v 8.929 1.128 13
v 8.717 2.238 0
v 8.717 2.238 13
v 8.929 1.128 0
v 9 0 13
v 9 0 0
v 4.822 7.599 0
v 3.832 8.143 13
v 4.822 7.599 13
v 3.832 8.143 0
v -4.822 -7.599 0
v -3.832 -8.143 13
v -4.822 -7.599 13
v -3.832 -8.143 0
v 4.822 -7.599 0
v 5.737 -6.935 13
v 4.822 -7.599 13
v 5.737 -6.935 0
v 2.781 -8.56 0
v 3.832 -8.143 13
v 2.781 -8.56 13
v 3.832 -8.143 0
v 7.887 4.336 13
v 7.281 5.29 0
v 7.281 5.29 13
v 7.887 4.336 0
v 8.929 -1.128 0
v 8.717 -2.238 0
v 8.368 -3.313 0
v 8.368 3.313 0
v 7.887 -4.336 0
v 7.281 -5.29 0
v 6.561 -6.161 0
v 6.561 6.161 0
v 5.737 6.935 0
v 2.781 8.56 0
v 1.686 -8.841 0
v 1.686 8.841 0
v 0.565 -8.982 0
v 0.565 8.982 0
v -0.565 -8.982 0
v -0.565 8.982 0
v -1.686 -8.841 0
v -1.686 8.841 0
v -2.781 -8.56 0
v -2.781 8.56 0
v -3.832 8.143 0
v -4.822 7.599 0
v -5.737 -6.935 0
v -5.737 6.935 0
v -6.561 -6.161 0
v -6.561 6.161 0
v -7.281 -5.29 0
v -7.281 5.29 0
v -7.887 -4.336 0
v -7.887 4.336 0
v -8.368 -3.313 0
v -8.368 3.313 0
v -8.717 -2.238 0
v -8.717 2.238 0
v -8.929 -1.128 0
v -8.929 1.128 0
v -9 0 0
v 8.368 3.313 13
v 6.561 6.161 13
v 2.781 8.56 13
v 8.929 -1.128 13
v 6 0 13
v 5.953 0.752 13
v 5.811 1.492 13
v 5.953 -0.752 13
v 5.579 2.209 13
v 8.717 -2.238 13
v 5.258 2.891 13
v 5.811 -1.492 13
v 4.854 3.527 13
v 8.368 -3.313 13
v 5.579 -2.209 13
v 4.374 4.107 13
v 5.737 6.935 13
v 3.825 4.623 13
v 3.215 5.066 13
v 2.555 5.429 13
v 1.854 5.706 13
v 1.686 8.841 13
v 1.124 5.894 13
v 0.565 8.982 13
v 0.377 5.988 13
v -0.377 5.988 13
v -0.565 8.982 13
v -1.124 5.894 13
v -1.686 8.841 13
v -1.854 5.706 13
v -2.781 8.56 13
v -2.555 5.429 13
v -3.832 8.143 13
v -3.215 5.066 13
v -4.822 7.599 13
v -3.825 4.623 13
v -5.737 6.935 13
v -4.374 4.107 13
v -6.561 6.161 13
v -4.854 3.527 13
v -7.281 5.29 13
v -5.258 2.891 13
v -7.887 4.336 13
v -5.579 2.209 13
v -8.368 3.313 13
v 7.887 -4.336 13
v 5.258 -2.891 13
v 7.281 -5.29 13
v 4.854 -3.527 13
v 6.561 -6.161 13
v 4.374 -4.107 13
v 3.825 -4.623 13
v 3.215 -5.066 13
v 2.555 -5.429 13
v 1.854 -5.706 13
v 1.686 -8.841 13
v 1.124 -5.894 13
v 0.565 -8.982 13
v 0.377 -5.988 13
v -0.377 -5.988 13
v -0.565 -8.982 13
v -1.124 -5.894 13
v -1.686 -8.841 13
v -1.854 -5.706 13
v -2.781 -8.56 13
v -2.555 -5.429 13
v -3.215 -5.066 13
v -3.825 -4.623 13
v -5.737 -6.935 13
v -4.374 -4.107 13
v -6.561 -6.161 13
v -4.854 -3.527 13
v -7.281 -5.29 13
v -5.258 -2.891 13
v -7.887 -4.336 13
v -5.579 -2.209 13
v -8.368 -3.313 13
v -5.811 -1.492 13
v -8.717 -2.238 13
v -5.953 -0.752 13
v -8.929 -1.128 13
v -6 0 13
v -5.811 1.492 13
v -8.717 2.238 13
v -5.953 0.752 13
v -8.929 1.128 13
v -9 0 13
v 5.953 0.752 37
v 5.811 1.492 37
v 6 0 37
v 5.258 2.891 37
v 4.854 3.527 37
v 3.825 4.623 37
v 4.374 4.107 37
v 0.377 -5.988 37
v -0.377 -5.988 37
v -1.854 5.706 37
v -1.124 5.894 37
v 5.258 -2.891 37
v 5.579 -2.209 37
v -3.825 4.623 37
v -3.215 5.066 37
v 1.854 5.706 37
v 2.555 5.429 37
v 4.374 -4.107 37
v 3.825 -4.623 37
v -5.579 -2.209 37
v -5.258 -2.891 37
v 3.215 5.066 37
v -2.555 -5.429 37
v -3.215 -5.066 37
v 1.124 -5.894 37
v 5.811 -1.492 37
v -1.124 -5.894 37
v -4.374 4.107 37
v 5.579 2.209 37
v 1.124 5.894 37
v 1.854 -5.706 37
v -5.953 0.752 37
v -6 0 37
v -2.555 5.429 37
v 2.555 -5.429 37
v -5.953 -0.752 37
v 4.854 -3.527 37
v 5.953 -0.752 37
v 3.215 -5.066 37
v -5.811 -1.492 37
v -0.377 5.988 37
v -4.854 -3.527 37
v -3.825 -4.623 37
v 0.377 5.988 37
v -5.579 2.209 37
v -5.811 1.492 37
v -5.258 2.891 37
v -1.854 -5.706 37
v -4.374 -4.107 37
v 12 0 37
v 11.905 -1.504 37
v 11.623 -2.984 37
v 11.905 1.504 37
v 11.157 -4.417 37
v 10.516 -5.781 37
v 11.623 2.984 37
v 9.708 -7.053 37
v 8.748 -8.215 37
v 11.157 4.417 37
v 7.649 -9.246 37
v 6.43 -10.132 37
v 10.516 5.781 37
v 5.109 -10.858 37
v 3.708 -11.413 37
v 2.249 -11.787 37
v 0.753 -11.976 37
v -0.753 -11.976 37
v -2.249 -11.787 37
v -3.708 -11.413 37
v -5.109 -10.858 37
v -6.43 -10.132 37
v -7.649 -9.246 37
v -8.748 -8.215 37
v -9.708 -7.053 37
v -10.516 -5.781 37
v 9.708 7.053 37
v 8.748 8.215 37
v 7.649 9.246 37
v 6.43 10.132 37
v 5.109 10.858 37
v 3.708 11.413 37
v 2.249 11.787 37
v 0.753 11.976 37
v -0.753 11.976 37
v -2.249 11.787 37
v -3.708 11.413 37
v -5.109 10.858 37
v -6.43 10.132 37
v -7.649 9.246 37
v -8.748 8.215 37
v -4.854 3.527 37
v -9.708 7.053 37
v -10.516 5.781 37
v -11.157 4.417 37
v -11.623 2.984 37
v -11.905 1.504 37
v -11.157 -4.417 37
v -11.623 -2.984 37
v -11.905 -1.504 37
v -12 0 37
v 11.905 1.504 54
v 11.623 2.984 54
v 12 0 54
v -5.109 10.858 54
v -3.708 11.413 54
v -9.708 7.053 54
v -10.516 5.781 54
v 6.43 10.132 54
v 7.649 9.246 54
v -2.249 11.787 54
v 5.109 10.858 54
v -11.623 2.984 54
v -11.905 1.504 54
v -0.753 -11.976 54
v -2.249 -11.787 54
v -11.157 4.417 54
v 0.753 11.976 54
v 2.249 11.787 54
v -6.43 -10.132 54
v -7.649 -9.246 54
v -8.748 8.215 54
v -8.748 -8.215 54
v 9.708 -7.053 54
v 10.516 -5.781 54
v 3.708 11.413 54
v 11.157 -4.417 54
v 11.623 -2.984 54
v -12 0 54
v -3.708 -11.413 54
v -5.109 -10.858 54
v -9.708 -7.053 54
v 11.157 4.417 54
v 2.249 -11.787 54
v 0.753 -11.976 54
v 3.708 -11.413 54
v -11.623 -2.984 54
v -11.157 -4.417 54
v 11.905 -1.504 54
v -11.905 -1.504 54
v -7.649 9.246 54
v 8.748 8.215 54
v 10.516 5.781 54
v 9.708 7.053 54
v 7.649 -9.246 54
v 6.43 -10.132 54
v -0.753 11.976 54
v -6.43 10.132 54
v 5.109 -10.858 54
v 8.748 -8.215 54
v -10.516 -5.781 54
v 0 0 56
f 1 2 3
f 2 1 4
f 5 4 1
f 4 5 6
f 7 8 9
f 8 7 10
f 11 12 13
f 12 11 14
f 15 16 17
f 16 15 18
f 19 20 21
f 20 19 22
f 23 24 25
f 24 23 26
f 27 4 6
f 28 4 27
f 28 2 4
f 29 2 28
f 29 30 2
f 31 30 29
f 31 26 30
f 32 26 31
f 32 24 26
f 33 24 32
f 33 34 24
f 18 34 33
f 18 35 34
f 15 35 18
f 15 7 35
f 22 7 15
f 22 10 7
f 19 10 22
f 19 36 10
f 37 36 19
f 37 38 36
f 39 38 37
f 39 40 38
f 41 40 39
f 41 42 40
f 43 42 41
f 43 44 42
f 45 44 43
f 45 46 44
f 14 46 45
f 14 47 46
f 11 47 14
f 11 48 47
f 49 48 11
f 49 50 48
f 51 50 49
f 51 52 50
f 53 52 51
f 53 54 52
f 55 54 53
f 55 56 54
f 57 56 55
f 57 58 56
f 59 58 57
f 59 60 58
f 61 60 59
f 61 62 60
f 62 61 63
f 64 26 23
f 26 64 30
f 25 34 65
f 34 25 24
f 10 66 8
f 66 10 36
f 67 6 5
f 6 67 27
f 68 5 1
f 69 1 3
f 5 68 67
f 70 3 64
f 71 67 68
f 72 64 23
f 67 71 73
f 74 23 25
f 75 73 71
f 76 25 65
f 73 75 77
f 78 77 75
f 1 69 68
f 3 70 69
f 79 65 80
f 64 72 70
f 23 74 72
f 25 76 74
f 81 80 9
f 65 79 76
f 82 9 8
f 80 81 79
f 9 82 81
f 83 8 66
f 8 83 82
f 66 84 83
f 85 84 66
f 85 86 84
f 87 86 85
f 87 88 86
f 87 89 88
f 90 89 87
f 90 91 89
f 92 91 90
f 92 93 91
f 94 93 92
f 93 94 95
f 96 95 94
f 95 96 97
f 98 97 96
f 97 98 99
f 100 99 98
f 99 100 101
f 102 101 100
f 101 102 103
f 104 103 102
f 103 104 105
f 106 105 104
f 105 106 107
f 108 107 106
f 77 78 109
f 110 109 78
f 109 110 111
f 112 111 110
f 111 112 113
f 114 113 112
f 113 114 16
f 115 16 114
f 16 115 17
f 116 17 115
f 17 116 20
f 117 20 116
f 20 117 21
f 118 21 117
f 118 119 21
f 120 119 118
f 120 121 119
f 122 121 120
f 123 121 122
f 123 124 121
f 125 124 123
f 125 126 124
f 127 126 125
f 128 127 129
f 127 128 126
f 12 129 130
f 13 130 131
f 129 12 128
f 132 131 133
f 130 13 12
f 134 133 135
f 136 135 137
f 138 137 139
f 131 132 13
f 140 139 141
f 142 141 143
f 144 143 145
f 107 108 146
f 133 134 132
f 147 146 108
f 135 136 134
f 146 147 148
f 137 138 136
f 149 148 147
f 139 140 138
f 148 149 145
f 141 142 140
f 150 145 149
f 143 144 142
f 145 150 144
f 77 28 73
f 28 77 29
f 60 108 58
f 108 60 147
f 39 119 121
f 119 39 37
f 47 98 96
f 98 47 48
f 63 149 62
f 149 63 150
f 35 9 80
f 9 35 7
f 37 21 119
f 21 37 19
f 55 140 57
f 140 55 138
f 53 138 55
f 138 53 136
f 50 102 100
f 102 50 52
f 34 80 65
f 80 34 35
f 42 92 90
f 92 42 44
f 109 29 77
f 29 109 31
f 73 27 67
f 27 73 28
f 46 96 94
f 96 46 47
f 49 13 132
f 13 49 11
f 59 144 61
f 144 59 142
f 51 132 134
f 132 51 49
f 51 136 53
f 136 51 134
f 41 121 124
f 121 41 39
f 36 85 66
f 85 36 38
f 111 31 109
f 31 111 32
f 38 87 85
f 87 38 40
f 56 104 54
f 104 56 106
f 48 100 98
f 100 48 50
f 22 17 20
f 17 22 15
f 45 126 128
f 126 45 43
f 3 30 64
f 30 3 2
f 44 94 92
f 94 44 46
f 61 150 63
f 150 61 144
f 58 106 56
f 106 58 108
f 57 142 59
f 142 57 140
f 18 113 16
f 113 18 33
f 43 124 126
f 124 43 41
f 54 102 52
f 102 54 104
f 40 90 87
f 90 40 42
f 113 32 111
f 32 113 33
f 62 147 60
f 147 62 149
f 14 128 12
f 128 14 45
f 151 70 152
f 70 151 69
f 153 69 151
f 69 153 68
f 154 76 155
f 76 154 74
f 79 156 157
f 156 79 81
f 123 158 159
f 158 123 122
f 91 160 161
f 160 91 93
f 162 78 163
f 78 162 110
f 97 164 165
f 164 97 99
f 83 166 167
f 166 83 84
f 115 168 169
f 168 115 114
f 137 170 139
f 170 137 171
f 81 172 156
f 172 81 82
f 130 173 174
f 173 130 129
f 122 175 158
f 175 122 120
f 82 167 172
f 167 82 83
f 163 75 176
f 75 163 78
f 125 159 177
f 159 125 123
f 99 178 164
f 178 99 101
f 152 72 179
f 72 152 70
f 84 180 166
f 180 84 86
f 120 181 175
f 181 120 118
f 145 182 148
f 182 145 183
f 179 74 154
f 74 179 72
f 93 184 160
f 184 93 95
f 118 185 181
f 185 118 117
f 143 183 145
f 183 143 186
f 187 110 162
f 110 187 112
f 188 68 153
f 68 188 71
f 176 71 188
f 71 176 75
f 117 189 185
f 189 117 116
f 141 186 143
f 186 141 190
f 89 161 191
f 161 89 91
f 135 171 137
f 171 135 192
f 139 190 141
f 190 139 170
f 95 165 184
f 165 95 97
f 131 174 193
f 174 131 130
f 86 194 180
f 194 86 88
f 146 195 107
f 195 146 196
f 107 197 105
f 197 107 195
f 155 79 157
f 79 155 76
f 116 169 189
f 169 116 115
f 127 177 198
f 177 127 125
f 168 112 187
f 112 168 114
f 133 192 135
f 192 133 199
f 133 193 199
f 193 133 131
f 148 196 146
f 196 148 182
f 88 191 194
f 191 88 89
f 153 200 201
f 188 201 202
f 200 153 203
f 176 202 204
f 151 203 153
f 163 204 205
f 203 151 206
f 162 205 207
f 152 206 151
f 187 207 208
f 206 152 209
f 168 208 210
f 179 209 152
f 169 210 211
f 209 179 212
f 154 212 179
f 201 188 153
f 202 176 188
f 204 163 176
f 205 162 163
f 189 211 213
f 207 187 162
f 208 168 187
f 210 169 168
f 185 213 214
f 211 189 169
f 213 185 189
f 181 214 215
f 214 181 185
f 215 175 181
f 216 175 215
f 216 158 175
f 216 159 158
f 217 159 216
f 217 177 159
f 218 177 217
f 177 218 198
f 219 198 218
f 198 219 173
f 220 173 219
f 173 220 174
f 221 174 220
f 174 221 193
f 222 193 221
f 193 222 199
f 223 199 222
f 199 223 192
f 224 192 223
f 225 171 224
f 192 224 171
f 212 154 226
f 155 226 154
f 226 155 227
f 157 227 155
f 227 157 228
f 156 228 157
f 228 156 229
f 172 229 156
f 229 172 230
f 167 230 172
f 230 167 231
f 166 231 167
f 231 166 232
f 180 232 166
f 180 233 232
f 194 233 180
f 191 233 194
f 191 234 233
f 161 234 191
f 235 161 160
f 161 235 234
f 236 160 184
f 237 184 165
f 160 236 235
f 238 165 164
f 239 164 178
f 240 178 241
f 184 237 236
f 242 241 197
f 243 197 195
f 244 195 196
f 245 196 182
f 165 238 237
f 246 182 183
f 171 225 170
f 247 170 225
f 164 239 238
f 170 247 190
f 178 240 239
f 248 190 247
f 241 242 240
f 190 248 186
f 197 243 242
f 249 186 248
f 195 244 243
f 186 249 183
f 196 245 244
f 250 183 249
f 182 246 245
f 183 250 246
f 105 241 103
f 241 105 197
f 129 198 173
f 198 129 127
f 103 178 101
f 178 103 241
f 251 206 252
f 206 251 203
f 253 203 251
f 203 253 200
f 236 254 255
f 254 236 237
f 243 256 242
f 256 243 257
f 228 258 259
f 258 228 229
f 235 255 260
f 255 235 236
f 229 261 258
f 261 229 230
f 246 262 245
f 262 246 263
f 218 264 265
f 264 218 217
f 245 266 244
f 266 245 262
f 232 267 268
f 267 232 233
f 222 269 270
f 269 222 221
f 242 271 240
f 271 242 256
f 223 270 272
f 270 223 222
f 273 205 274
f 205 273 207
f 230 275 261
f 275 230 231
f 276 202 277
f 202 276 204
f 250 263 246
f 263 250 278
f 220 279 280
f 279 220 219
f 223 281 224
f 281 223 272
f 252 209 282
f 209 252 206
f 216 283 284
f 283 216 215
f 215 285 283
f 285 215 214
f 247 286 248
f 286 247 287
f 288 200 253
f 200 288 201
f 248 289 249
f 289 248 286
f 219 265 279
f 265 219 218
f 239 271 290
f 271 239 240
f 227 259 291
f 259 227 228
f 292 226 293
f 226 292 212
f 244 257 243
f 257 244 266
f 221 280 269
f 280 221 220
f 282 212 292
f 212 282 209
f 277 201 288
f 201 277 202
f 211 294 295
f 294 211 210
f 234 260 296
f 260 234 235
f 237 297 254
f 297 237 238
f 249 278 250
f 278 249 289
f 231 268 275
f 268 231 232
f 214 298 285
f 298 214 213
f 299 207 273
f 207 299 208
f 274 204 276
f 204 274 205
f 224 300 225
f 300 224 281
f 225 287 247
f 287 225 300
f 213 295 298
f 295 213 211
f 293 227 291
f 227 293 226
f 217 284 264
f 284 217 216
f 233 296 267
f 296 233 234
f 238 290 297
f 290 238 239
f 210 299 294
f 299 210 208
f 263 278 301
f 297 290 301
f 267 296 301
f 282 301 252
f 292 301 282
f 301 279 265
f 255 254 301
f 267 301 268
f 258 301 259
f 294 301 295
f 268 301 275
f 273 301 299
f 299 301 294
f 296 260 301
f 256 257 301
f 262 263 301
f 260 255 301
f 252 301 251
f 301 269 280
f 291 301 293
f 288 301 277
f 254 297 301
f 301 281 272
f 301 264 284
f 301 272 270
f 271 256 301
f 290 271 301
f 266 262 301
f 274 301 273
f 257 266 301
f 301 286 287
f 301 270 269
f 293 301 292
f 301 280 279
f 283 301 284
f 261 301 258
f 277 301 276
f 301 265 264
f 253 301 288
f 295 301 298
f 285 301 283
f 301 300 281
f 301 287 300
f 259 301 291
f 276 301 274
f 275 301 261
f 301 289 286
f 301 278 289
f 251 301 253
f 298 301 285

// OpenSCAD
$fn = 50;

base_height = 13;
base_radius = 9;

pillar_height = 24;
pillar_radius = 6;

tank_height = 17;
tank_radius = 12;

roof_height = 2;

cylinder(r = base_radius, h = base_height);

translate([0, 0, base_height])
cylinder(r = pillar_radius, h = pillar_height);

translate([0, 0, base_height + pillar_height])
cylinder(r = tank_radius, h = tank_height);

translate([0, 0, base_height + pillar_height + tank_height])
rotate_extrude()
polygon([[0, 0], [0, roof_height], [tank_radius, 0]]);

tube_radius = 1.5;
tube_length_1 = 10;
tube_length_2 = 3;
tube_curve_radius_3 = 2.5;

// translate([pillar_radius + 2, 0, base_height + pillar_height - tube_length_1]) {
//     cylinder(r = tube_radius, h = tube_length_1);

//     rotate([270, 0, 0])
//     translate([tube_radius, 0, 0])
//     rotate_extrude(angle = 180)
//     translate([tube_radius, 0, 0])
//     circle(r = tube_radius);

//     translate([2 * tube_radius, 0, 0])
//     cylinder(r = tube_radius, h = tube_length_2);

//     translate([2 * tube_radius, 0, tube_length_2])
//     rotate([90, 0, 180])
//     translate([- tube_curve_radius_3, 0, 0])
//     rotate_extrude(angle = 90)
//     translate([tube_curve_radius_3, 0, 0])
//     circle(r = tube_radius);
// }
